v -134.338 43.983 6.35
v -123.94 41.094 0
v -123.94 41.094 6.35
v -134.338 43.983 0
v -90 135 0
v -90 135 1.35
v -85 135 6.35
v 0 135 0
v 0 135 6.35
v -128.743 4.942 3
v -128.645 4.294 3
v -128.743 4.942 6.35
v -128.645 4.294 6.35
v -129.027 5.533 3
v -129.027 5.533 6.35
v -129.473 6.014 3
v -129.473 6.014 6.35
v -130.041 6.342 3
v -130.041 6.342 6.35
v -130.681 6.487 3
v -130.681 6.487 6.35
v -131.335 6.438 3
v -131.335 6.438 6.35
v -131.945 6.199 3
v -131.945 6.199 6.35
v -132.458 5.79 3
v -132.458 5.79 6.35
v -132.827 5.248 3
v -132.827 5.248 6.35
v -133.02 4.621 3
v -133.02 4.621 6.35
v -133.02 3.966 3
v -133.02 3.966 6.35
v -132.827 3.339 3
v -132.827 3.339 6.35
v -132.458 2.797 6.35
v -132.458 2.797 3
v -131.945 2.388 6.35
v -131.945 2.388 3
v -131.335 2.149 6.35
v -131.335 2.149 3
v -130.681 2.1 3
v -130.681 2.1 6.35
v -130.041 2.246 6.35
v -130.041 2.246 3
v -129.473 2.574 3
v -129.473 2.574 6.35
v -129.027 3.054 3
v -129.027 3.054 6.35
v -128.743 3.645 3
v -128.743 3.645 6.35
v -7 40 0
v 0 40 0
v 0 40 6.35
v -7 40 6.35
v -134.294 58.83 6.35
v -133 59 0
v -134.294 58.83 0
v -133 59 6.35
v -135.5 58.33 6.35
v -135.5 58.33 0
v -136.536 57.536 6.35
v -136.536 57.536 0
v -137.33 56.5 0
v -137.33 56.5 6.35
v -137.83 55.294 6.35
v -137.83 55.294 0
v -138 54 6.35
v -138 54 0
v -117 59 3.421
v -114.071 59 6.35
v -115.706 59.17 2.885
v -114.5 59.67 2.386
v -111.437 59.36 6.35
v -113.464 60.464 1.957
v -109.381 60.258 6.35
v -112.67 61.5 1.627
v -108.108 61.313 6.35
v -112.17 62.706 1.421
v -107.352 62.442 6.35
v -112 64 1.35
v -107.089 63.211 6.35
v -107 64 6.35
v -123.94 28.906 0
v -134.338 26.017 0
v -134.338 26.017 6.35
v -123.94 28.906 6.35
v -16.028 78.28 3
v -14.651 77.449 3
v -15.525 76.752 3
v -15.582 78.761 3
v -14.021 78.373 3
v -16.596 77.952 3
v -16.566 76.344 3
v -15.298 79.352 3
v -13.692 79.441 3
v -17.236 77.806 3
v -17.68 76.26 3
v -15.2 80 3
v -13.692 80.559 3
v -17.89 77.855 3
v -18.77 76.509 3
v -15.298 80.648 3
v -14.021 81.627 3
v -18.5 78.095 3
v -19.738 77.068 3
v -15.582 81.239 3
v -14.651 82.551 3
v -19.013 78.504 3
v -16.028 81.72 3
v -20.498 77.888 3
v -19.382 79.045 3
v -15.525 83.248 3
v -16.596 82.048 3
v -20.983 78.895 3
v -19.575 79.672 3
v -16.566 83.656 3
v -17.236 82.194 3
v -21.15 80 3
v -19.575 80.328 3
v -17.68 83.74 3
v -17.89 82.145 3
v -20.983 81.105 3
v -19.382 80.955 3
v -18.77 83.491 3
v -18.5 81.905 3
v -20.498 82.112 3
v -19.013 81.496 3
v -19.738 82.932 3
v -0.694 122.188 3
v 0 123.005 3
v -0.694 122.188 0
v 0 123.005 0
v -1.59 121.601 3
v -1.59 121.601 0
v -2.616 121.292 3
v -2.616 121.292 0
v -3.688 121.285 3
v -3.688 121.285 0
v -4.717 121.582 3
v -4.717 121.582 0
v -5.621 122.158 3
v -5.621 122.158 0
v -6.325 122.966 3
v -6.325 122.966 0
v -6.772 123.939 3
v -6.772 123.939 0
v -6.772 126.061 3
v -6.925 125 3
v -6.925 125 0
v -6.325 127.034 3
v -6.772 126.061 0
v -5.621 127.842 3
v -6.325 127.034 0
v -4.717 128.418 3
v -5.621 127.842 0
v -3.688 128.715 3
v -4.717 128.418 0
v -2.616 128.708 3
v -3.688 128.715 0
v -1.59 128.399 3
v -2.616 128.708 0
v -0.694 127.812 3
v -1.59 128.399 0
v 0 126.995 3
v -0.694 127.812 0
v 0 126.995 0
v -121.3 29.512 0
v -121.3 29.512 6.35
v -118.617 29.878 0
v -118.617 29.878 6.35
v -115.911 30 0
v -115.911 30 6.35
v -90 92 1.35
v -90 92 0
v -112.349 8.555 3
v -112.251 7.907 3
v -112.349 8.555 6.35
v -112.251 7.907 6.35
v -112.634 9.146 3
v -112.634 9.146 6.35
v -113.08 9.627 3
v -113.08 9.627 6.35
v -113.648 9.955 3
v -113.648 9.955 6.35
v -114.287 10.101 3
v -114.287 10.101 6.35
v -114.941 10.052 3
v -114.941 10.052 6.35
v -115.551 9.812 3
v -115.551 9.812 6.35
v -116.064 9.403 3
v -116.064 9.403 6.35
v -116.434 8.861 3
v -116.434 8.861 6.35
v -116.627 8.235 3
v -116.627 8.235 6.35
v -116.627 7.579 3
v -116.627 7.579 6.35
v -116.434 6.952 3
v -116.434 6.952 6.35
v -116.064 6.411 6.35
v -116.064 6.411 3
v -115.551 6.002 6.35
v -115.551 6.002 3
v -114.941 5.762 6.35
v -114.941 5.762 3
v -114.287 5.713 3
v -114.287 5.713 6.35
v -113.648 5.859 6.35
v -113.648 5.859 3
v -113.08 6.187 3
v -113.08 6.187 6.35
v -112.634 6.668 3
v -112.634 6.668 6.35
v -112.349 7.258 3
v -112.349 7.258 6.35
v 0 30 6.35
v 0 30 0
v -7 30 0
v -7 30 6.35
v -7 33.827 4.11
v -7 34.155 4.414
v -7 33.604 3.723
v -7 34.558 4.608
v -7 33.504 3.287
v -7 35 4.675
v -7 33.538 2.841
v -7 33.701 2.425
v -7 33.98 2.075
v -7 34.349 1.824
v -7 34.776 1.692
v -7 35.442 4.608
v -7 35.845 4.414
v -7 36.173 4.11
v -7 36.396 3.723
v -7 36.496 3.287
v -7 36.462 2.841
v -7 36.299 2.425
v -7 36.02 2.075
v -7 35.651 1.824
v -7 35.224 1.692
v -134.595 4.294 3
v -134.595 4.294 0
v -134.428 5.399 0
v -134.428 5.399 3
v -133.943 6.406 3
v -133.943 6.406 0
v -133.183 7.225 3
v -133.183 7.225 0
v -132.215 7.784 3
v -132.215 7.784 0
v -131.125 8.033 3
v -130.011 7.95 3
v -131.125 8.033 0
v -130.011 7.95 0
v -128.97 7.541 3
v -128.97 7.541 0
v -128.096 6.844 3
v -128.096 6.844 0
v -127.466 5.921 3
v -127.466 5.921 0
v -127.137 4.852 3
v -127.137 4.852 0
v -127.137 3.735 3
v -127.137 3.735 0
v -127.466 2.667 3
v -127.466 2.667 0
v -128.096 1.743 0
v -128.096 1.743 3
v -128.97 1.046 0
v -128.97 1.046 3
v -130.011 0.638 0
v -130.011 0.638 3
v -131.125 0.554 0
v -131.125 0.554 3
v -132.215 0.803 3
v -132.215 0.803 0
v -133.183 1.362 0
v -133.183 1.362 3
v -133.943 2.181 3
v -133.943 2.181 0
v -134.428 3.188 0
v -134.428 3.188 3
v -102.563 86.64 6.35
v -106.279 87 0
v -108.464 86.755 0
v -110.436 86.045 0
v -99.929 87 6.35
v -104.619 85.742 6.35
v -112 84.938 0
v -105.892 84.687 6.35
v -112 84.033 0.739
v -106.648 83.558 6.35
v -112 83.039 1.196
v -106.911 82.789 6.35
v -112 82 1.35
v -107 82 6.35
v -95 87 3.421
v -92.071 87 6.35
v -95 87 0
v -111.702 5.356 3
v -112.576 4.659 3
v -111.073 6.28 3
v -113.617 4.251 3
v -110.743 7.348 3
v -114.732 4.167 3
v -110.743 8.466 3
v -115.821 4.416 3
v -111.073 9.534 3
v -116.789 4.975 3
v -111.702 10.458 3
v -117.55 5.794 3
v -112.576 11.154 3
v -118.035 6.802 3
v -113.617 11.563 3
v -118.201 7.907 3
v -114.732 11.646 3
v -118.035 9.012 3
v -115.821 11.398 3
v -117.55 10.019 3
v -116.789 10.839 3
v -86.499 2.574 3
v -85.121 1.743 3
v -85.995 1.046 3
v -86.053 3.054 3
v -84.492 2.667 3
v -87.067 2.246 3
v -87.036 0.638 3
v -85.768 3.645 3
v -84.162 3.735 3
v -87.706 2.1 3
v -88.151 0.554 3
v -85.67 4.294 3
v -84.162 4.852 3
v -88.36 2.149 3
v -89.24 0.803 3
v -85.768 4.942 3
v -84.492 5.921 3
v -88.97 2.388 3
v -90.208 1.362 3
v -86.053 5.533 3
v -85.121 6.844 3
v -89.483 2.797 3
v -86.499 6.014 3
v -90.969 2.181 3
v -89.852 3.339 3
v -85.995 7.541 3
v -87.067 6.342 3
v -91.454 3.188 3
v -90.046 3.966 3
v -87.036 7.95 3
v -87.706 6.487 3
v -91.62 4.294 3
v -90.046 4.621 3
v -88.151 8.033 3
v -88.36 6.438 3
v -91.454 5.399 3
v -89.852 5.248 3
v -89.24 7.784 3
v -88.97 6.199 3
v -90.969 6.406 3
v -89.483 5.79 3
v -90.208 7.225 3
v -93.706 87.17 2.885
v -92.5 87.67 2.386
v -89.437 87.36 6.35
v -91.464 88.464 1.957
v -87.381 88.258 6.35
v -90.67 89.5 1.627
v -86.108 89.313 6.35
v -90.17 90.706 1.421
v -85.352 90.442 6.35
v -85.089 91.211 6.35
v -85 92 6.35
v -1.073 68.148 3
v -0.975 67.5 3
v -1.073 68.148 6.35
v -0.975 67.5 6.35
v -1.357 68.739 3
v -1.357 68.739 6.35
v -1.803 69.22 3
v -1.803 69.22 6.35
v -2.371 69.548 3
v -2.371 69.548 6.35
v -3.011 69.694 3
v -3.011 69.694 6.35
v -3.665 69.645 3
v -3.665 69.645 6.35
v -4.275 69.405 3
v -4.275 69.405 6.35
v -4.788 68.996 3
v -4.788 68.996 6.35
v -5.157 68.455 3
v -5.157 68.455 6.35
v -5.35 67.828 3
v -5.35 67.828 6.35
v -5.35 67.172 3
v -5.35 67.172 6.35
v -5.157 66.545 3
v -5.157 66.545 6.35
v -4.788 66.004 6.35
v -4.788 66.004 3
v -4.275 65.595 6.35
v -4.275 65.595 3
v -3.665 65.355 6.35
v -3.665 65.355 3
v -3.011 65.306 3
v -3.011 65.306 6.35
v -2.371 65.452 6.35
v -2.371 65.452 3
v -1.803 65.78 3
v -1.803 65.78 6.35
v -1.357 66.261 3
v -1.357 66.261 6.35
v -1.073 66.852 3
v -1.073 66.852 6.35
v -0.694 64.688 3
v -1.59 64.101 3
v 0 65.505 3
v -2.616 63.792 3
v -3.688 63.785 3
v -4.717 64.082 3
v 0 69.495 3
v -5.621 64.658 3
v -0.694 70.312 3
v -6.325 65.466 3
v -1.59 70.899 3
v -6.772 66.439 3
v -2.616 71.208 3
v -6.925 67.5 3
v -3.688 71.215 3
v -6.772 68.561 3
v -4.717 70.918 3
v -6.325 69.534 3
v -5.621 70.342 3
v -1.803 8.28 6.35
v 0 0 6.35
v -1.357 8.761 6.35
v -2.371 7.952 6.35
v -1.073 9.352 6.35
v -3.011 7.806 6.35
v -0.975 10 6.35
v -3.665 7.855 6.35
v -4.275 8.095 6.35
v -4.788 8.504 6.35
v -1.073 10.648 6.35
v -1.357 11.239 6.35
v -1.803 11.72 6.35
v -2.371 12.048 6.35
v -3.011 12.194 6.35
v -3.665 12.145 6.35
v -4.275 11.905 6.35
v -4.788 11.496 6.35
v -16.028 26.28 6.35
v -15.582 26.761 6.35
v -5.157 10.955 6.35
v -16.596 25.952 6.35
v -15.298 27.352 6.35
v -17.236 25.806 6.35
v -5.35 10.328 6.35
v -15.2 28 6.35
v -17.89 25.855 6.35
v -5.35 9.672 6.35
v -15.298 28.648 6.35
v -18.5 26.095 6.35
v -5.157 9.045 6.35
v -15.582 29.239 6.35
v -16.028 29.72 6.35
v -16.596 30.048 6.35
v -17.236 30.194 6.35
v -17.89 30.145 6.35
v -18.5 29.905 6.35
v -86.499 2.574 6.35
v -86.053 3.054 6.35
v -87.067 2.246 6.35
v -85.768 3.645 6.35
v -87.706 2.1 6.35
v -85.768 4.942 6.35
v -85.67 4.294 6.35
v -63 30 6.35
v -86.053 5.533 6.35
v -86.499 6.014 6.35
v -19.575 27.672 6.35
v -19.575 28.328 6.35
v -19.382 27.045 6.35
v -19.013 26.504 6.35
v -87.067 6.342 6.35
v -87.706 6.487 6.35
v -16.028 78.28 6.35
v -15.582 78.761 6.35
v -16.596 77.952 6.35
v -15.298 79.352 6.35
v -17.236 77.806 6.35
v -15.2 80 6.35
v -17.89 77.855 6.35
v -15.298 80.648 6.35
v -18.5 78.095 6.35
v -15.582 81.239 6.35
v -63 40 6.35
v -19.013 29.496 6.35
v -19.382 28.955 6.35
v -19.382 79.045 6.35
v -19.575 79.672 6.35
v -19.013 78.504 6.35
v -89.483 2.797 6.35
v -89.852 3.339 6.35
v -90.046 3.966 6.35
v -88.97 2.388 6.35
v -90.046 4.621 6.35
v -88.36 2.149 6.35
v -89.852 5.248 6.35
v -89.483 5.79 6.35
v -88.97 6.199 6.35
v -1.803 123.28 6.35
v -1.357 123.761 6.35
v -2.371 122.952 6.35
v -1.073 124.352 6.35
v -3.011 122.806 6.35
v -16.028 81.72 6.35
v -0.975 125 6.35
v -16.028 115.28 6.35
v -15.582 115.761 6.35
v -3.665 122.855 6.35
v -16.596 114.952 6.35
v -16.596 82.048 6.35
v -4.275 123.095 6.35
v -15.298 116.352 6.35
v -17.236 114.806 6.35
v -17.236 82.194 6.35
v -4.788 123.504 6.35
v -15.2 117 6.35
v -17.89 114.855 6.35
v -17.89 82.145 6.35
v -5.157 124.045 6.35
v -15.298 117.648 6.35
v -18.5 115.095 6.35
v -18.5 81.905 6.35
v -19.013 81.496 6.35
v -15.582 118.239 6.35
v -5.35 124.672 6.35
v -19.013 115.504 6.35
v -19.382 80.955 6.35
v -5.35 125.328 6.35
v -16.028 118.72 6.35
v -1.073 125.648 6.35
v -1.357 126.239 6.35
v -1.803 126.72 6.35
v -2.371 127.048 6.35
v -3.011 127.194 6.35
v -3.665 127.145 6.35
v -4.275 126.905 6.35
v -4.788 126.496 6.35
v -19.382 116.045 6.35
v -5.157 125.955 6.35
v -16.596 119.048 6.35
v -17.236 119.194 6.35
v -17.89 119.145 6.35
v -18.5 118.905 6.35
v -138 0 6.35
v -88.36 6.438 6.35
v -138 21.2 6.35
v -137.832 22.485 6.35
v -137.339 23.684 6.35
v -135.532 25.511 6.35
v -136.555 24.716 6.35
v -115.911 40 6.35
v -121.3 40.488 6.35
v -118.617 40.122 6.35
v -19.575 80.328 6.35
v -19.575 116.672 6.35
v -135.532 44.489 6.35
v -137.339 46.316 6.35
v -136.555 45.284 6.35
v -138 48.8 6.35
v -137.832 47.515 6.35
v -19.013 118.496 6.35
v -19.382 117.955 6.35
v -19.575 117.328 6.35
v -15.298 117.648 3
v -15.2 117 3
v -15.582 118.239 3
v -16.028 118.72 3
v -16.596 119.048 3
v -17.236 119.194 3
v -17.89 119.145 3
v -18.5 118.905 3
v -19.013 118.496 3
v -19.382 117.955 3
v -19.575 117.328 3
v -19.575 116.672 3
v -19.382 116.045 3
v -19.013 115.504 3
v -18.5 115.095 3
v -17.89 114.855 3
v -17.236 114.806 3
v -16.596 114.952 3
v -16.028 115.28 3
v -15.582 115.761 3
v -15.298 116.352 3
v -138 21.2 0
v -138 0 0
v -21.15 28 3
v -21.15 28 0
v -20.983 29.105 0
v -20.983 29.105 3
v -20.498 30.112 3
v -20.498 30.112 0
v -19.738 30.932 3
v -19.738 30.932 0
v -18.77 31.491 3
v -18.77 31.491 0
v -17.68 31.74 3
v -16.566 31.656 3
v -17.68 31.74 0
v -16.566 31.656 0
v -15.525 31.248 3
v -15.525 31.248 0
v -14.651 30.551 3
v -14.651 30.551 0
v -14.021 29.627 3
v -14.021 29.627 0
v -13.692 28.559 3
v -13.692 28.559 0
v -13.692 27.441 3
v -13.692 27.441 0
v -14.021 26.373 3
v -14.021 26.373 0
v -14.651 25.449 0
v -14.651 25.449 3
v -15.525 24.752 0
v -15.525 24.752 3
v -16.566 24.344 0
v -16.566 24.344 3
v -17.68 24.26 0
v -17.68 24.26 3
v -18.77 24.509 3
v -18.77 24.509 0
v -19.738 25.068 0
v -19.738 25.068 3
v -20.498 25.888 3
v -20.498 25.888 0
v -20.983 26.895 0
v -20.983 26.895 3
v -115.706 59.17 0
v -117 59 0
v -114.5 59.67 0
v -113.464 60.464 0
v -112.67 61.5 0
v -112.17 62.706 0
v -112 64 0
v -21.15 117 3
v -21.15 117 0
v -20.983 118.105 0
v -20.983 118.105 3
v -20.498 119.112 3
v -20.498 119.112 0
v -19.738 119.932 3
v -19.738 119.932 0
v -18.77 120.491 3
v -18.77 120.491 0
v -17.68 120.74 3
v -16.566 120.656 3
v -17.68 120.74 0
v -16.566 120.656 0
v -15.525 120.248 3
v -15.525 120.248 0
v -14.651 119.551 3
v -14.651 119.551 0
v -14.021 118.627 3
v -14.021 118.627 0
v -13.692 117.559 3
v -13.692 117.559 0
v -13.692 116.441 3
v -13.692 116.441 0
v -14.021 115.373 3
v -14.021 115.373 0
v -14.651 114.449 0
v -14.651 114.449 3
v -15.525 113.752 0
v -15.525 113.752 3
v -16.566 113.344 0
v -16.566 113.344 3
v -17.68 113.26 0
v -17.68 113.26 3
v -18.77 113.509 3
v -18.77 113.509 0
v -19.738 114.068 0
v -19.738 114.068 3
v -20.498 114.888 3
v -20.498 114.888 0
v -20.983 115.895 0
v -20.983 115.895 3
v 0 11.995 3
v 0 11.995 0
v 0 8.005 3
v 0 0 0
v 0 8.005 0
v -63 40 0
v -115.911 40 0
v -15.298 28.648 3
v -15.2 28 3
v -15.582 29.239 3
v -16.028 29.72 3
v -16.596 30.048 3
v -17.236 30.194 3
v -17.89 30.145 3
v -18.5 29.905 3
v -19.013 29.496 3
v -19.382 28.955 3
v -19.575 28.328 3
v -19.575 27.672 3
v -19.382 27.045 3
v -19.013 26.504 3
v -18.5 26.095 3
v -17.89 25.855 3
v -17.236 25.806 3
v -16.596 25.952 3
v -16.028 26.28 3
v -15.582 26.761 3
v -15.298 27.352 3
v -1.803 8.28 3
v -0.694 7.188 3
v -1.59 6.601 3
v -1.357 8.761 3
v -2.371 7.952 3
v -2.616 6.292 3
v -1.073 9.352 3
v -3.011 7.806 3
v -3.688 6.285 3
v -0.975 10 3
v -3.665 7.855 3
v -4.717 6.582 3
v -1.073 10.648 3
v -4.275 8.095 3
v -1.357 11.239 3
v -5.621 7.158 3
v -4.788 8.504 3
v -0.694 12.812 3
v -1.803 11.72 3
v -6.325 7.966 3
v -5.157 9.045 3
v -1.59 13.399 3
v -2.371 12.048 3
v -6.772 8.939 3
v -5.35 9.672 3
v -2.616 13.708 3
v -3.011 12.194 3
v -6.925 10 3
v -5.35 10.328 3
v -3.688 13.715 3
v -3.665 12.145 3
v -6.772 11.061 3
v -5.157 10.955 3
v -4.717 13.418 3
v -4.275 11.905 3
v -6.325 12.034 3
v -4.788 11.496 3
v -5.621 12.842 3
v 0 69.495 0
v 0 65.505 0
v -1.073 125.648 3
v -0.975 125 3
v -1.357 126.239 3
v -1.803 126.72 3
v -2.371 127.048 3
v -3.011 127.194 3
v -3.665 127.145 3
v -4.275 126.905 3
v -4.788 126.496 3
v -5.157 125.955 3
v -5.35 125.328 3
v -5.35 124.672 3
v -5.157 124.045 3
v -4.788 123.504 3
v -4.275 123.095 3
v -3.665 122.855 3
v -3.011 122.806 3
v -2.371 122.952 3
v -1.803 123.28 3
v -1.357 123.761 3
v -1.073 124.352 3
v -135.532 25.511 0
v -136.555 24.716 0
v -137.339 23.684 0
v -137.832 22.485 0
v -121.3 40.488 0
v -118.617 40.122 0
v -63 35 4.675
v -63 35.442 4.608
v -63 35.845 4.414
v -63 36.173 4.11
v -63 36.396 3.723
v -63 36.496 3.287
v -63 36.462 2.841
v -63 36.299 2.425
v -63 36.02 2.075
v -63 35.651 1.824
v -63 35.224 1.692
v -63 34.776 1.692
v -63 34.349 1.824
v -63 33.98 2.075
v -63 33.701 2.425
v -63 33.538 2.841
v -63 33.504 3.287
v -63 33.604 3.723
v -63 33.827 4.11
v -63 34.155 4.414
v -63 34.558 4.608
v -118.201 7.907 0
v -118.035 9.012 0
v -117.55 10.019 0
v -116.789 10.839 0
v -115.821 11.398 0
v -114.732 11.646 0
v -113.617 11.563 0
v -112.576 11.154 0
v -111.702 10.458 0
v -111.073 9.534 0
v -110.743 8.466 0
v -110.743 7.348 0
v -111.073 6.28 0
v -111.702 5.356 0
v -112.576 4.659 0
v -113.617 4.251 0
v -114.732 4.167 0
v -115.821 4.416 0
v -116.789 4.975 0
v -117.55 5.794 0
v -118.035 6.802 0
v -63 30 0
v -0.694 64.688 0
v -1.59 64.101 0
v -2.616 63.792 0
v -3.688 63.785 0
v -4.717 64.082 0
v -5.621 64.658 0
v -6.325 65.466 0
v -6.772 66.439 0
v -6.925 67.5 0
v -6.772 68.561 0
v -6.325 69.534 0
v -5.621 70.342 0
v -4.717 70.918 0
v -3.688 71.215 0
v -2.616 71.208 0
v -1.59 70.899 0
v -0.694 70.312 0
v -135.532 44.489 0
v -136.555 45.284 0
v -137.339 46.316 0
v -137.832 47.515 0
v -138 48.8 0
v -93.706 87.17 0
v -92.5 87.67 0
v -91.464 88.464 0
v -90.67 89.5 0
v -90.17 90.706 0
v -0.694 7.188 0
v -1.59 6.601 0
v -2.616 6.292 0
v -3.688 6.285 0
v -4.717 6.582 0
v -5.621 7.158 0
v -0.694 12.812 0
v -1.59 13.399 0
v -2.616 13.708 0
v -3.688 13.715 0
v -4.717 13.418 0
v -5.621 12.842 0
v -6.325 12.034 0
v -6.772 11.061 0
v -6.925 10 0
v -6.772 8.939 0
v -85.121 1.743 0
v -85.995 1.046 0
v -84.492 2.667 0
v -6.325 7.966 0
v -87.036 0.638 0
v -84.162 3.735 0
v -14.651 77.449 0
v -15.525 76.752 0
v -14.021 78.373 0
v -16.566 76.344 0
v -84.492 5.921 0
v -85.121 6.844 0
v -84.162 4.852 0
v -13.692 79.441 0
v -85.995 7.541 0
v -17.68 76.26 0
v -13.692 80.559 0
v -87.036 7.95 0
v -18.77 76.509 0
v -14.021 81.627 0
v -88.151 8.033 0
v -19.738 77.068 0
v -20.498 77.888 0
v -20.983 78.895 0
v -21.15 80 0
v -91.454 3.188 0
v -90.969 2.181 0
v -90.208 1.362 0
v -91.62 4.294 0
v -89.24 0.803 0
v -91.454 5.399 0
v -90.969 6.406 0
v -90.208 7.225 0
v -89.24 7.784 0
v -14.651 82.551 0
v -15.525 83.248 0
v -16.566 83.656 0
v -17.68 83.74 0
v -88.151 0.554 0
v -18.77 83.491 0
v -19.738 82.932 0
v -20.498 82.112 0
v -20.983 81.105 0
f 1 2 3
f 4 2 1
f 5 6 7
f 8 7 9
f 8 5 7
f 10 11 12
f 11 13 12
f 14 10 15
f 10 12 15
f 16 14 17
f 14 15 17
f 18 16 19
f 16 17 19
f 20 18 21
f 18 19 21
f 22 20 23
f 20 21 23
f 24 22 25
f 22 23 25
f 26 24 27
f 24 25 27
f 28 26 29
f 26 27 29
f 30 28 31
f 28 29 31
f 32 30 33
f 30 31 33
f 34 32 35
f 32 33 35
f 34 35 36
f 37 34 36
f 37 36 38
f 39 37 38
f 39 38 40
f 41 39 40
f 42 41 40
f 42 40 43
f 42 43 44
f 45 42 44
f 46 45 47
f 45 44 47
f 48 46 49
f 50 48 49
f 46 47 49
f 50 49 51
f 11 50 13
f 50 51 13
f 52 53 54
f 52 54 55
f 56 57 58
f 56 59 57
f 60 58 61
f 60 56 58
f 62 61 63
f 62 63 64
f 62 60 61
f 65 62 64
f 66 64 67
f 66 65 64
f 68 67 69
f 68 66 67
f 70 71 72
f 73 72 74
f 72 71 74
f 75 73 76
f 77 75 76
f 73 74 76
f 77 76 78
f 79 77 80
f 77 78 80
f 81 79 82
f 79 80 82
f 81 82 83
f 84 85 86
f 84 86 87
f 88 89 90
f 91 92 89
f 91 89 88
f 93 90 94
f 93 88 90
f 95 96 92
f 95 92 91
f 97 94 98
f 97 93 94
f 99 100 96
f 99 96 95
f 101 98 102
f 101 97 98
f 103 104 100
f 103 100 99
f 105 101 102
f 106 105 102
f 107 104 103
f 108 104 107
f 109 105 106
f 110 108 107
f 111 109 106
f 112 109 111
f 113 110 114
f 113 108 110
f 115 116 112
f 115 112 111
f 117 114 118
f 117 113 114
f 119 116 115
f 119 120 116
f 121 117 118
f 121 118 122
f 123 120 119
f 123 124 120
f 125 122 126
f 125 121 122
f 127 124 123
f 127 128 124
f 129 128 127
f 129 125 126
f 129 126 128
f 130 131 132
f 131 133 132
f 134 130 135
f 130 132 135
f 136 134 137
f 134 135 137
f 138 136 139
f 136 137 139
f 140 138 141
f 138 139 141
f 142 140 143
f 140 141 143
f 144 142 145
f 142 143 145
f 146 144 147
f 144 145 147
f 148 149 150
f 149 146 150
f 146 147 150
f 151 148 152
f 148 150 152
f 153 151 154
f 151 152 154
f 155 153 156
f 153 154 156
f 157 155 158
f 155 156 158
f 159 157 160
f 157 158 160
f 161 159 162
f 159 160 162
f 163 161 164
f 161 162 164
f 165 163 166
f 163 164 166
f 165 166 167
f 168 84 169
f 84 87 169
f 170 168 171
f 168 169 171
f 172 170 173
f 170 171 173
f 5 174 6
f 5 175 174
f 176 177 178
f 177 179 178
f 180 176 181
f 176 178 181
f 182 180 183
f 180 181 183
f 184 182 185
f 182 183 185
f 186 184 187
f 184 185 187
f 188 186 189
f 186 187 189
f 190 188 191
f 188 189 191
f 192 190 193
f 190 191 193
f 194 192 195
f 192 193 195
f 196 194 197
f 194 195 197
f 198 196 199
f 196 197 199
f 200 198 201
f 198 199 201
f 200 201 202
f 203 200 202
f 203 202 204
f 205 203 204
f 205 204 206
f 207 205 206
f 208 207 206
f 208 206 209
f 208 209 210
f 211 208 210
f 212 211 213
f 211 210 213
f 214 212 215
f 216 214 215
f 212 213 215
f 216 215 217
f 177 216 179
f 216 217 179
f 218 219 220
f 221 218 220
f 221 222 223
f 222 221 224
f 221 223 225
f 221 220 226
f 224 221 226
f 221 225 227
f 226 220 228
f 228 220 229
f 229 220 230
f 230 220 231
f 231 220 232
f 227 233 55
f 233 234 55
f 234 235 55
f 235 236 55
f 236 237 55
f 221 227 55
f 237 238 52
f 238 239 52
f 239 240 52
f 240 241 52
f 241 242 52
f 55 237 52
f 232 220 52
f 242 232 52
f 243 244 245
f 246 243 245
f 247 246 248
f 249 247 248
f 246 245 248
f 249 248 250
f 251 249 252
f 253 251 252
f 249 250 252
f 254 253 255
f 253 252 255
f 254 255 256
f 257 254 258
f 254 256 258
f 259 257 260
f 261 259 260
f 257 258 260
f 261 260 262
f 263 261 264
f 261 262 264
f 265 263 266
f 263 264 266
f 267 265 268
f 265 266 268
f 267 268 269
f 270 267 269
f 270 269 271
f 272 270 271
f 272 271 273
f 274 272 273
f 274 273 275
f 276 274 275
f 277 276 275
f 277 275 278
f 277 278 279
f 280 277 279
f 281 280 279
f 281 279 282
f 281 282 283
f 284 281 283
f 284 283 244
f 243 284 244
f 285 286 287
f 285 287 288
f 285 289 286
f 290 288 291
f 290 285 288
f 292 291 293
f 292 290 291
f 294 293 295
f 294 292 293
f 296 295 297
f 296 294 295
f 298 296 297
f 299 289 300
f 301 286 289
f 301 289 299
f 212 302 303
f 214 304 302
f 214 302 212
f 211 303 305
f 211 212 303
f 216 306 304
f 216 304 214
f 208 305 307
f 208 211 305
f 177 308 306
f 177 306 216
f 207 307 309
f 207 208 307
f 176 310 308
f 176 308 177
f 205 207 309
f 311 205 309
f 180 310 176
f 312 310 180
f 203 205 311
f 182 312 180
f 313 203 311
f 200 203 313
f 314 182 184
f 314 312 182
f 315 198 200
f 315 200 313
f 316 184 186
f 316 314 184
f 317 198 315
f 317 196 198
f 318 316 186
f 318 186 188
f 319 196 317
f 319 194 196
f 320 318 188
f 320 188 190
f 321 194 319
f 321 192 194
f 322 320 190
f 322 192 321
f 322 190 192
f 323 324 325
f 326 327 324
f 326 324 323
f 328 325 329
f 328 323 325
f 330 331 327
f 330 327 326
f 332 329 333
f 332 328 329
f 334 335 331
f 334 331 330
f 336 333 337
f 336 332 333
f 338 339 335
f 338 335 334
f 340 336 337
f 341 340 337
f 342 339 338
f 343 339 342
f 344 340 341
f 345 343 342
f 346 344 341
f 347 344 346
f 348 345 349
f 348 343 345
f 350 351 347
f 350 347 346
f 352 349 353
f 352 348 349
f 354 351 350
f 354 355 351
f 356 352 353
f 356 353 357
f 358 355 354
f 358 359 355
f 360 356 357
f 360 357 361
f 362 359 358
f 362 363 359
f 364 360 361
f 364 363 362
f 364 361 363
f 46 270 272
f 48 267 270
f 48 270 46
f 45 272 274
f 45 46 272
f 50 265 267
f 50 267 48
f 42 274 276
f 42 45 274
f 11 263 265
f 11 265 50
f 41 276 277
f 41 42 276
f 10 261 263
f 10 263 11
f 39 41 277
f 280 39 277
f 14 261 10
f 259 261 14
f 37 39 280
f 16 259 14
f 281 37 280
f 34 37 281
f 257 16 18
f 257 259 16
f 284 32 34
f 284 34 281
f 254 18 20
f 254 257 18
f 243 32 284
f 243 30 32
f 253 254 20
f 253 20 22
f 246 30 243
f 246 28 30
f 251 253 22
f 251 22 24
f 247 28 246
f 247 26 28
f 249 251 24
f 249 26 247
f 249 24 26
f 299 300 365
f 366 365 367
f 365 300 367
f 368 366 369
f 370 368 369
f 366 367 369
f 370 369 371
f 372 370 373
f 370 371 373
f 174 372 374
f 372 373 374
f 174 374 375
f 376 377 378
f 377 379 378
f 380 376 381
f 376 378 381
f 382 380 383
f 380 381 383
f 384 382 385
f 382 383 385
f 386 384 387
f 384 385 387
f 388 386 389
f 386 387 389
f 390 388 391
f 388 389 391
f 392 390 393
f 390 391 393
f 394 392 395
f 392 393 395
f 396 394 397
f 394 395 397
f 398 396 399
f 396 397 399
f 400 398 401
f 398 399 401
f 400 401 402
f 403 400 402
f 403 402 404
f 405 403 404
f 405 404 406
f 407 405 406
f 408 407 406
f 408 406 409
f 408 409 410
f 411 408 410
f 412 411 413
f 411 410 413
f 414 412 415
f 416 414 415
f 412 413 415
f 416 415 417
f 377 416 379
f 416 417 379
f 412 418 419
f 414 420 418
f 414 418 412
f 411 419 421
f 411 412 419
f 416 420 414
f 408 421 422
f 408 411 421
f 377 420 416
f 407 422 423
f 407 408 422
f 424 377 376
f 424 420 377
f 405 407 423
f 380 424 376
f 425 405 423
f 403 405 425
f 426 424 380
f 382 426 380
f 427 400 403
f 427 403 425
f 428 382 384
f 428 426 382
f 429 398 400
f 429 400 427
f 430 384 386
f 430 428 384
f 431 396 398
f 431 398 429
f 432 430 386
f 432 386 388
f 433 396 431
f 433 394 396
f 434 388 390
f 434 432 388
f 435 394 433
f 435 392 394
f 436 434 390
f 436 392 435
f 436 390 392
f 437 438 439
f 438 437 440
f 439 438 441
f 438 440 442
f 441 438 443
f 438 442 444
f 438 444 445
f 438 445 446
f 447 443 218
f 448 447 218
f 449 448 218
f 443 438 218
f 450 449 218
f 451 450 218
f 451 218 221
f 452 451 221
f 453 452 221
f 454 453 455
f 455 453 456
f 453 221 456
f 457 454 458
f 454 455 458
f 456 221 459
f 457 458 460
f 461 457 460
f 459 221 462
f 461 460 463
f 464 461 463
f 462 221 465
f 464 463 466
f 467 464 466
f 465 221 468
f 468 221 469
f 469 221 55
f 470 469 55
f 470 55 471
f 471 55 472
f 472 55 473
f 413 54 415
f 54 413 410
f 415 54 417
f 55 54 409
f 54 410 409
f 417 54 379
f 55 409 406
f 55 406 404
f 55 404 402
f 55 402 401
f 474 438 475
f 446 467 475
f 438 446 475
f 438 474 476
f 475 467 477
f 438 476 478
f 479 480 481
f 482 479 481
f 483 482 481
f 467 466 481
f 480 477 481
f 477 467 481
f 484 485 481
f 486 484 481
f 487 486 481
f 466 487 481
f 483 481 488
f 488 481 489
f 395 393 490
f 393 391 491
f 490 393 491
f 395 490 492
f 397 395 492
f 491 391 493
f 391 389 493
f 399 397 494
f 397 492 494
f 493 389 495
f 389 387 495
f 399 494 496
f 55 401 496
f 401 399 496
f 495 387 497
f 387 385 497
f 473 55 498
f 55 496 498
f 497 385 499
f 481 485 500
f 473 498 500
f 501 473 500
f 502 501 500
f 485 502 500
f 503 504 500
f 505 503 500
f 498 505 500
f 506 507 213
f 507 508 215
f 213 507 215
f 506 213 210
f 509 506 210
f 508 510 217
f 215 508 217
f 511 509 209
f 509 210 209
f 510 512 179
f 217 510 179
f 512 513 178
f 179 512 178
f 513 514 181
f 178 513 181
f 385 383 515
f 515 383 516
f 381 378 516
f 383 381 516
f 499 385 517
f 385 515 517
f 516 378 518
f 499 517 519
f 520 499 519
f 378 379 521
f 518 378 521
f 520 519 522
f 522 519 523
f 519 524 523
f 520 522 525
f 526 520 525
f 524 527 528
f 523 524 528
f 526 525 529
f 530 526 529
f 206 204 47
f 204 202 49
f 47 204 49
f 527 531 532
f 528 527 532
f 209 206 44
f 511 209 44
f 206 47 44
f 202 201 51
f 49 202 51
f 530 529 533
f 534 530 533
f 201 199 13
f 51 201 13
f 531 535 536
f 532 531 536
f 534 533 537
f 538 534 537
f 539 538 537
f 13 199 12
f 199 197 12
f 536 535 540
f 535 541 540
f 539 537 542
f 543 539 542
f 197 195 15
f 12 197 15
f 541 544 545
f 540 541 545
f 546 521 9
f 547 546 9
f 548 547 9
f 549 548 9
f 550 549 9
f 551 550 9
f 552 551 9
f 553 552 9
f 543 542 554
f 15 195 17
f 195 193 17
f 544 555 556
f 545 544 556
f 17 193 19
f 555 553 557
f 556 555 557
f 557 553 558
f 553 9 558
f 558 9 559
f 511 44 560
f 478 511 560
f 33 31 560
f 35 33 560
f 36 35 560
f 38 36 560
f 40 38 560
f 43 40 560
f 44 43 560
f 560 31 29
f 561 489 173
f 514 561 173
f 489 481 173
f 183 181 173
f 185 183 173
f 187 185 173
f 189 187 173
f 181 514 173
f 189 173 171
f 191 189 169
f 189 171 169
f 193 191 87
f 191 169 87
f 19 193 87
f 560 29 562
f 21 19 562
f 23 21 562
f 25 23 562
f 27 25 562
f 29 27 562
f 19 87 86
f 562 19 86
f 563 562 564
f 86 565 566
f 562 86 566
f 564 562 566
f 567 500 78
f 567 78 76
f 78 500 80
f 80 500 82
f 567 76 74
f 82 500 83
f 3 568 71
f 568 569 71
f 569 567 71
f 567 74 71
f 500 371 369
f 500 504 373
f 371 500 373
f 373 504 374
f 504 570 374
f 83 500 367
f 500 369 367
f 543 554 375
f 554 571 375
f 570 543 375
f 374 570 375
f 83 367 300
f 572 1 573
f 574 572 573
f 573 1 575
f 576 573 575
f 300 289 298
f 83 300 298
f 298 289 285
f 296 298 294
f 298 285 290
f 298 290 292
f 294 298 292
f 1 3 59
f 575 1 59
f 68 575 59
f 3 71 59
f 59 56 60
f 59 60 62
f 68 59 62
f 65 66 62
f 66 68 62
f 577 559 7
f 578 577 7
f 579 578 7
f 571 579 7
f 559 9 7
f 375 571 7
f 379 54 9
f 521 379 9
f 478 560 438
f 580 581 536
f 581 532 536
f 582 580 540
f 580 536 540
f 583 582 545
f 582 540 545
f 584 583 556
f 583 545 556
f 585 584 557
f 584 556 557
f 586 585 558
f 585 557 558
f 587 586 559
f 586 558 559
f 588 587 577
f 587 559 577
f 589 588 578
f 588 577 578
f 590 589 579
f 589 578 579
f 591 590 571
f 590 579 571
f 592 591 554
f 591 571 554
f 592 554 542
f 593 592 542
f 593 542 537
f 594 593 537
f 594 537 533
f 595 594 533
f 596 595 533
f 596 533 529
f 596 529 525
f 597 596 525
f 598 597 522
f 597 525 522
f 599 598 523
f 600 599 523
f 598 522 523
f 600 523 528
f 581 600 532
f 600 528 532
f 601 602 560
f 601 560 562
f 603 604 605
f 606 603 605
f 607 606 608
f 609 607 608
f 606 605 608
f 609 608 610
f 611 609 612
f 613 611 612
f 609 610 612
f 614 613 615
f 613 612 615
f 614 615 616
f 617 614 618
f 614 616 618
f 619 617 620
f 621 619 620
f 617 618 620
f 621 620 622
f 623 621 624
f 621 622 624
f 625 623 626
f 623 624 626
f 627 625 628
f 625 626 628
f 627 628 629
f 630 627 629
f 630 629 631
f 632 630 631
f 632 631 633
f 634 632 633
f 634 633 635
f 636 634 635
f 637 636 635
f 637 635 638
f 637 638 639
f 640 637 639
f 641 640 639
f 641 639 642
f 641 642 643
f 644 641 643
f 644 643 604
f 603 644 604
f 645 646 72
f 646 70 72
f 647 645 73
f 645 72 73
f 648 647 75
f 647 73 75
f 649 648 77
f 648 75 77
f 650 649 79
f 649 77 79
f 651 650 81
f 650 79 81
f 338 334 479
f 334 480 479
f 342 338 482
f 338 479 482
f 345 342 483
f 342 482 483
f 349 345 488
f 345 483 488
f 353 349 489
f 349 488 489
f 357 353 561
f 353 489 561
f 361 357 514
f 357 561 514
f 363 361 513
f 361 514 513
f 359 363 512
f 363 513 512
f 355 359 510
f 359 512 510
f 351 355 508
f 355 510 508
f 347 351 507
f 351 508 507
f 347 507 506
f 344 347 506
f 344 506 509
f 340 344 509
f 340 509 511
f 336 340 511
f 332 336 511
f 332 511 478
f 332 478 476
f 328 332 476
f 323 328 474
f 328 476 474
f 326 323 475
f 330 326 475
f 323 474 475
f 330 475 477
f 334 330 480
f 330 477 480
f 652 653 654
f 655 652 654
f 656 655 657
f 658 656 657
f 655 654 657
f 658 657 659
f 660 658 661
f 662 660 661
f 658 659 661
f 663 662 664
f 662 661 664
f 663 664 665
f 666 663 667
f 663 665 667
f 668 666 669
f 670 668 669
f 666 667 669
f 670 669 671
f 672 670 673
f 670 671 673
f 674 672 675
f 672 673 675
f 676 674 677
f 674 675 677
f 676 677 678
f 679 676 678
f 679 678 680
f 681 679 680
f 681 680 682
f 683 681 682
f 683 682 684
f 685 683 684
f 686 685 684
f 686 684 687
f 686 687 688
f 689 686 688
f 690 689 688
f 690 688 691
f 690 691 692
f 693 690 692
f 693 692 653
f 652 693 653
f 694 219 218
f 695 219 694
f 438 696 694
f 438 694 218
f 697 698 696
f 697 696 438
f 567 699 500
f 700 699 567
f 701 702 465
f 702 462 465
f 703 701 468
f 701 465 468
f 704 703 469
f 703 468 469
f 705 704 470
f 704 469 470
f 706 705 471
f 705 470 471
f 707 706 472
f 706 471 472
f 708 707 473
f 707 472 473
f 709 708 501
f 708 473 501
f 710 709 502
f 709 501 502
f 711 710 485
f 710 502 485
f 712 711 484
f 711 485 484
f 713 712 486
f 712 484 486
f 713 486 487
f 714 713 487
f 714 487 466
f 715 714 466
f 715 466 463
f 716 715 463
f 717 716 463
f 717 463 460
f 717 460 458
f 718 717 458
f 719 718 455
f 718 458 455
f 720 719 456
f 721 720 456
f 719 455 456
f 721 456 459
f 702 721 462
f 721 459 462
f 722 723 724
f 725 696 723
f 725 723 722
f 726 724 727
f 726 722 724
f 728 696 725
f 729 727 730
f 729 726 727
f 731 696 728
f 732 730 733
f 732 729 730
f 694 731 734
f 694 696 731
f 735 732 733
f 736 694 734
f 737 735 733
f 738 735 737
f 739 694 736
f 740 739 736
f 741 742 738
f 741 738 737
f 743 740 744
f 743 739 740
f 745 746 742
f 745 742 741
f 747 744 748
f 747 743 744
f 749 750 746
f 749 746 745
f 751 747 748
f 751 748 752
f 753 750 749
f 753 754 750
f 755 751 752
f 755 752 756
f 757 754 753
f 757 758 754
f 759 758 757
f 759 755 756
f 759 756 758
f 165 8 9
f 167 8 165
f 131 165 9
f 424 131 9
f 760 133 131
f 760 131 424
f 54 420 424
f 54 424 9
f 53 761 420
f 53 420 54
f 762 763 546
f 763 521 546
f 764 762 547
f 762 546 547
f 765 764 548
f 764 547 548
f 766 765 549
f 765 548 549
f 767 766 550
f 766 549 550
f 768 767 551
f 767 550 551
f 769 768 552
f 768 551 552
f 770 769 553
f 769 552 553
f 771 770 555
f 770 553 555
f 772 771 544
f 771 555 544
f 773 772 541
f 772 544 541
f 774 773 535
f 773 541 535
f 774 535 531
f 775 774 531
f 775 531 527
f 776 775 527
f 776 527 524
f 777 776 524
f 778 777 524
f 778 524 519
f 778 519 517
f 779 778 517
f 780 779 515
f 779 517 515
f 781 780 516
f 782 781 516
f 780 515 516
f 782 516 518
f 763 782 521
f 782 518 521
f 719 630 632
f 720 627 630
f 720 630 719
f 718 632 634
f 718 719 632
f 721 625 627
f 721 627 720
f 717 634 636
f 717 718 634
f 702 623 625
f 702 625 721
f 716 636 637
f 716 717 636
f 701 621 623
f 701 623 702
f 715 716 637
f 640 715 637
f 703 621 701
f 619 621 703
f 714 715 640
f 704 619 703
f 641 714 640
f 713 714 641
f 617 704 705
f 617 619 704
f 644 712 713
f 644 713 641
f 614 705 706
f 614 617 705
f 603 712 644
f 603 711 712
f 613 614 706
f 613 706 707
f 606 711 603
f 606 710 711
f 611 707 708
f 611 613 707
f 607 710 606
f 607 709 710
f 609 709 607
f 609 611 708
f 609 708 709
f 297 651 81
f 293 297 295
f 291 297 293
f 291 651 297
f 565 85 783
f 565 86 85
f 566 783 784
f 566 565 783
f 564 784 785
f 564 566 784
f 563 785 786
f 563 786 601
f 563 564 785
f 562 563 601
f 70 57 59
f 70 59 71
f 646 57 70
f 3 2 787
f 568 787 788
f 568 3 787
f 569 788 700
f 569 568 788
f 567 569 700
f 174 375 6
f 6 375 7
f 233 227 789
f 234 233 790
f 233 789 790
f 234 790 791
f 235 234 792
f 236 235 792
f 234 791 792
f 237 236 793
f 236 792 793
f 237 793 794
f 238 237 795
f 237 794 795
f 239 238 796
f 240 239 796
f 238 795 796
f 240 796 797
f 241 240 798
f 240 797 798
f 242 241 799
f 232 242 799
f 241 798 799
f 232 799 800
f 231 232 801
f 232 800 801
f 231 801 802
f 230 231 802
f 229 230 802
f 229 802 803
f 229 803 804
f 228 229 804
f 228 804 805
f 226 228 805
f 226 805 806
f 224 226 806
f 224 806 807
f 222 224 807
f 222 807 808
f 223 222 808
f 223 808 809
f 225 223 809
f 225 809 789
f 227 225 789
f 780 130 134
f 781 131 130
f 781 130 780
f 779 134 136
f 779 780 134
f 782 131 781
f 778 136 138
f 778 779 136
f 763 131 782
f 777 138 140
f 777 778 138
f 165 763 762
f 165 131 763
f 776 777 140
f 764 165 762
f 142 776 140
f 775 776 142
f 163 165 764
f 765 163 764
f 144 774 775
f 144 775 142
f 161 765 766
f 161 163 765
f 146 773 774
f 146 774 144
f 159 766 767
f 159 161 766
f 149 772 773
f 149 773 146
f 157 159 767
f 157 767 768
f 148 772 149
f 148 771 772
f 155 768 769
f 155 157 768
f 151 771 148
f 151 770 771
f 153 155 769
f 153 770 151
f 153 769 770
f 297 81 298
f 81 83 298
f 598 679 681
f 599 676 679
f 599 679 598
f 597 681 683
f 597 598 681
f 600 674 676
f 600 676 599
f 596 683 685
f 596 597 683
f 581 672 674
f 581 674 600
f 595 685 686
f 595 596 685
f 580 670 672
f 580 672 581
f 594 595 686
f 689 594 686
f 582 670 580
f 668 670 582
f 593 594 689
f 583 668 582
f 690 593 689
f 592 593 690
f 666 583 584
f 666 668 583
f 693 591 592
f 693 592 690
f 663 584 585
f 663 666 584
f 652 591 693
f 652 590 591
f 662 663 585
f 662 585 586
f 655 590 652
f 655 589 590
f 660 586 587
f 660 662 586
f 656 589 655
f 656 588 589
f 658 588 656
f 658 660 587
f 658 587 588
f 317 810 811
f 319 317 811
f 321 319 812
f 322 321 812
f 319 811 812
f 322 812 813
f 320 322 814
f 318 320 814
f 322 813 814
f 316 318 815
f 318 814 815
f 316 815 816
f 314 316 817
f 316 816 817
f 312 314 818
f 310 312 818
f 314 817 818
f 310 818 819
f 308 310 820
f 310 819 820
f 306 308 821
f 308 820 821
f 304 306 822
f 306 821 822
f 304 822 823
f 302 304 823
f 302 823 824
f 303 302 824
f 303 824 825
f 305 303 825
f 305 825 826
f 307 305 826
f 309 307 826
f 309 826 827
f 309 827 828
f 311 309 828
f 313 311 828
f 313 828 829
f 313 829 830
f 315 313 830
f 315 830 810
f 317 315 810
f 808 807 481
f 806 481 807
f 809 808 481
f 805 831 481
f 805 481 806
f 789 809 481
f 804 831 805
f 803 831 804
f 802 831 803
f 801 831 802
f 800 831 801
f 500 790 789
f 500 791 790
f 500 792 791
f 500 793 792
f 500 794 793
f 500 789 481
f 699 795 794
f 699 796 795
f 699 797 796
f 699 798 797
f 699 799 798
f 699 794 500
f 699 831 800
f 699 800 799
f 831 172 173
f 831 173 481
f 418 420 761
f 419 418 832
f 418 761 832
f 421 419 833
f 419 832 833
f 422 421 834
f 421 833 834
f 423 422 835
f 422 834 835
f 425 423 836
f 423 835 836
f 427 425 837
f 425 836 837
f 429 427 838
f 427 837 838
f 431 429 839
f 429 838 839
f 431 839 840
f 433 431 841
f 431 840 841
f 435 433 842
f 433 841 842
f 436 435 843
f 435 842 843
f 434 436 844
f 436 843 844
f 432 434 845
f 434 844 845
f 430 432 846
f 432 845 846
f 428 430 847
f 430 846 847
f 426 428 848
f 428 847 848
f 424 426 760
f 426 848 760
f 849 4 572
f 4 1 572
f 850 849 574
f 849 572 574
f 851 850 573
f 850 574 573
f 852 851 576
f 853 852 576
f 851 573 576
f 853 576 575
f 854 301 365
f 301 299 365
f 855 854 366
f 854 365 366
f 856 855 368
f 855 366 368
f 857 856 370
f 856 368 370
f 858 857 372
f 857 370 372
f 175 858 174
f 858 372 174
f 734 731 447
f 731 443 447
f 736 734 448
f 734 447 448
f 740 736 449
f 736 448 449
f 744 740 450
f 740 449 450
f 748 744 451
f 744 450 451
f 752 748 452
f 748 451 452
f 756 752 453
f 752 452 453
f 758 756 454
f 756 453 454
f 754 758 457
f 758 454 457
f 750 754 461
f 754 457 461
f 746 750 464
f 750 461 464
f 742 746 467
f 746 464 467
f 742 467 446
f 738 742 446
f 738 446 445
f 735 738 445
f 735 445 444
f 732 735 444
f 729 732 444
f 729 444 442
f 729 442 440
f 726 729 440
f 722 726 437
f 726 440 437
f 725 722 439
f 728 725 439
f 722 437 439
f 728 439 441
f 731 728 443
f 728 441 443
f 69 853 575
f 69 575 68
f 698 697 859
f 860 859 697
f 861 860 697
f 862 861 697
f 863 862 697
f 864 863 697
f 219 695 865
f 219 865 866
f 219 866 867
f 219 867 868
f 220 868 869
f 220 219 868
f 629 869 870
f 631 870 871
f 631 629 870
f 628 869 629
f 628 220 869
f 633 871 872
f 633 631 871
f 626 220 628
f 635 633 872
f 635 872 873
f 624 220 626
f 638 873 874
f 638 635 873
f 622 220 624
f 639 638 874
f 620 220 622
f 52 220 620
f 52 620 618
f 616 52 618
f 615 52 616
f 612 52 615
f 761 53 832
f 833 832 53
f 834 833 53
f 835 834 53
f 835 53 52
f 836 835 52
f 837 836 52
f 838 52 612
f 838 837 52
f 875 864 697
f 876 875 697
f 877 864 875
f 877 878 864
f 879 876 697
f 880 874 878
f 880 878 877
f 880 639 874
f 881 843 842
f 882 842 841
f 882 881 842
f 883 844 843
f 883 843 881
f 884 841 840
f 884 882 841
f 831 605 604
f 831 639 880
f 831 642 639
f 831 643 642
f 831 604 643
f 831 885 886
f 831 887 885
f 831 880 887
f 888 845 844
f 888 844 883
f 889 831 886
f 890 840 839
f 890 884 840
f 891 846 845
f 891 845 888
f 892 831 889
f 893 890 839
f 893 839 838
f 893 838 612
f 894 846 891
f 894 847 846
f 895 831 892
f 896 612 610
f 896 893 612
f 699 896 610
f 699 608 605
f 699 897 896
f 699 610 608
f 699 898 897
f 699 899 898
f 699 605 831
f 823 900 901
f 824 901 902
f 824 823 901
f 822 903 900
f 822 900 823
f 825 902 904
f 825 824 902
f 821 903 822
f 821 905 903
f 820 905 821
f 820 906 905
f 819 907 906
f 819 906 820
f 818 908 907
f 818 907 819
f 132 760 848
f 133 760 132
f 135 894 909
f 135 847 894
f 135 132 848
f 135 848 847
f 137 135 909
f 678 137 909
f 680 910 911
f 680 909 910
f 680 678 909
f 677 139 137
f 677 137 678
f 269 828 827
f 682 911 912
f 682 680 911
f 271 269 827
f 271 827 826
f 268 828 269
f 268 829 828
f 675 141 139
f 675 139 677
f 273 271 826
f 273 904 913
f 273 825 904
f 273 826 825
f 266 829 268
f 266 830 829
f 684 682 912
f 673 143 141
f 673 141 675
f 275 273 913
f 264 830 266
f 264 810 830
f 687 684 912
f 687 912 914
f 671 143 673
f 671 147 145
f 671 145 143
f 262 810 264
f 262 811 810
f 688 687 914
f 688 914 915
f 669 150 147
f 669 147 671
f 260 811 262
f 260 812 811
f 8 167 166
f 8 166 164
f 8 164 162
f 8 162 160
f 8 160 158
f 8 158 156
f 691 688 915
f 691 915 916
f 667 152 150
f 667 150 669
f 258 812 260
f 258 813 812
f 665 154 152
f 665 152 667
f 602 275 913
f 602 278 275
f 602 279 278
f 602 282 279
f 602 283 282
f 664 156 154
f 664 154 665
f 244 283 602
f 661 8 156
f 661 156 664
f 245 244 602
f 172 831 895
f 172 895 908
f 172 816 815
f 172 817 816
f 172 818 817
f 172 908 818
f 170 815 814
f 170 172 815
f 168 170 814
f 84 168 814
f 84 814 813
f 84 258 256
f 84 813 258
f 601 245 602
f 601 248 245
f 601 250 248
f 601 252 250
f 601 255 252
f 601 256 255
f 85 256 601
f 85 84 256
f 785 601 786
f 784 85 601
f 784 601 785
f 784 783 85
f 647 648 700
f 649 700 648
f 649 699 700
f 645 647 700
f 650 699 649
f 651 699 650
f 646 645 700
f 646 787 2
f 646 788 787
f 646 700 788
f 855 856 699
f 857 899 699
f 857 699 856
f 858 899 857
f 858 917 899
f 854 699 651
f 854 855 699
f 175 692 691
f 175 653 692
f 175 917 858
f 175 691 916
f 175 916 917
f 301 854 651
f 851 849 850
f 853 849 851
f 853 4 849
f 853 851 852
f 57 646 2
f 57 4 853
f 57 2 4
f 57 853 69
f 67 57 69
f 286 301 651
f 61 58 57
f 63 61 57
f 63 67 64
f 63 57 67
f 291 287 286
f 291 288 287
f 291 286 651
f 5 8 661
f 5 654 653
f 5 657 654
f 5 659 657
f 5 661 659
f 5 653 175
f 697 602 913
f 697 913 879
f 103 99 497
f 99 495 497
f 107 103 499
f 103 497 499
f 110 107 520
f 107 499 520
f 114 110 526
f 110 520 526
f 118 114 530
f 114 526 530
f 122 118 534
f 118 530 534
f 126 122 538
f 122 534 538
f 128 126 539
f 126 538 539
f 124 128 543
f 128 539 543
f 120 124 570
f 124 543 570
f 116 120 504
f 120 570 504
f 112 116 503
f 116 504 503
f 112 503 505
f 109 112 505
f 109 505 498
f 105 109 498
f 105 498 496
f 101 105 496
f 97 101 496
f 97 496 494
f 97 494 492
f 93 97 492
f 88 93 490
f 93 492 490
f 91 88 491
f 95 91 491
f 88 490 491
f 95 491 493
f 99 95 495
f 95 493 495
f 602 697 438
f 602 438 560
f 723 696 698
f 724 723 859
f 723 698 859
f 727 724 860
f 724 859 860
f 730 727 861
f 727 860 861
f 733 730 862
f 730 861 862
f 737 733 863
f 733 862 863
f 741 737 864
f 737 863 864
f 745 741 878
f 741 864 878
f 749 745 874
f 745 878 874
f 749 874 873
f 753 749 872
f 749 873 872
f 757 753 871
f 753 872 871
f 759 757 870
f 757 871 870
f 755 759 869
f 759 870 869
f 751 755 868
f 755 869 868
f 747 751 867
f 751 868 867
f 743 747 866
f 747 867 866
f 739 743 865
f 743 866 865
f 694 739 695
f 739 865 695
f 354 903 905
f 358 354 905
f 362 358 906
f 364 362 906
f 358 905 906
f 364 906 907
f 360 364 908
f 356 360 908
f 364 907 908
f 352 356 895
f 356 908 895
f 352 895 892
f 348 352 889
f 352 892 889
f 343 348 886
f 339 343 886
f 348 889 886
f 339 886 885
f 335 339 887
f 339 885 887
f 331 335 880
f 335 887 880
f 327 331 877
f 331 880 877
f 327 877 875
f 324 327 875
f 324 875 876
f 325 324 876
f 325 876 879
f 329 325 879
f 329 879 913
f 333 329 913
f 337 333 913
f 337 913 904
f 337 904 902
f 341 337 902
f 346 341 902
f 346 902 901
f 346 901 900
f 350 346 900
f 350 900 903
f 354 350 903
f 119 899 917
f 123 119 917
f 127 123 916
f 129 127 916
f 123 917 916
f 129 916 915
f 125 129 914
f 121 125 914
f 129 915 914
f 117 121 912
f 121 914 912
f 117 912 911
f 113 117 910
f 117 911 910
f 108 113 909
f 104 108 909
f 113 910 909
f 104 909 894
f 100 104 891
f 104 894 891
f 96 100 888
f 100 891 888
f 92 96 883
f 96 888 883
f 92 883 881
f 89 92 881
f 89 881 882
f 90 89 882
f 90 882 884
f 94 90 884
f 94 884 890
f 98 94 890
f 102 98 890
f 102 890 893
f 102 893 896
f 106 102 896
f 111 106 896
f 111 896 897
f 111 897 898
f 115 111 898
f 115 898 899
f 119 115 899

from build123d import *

# Parameters (mm, degrees)
BOSS_EXTRUDE1_DEPTH = 6.35
CUT_EXTRUDE1_DEPTH  = 194.156212688
SKETCH5_R           = 1.5
CUT_EXTRUDE2_DEPTH  = 155.564945897
FILLET1_R           = 30
CHAMFER1_SIZE       = 5
FILLET2_R           = 5
FILLET3_R           = 5
SKETCH6_W           = 7
SKETCH6_H           = 10
CUT_EXTRUDE3_DEPTH  = 194.156212688
HOLE1_D             = 4.4
HOLE1_CBORE_D       = 7.5
HOLE1_CBORE_DEPTH   = 3
HOLE2_D             = 4.4
HOLE2_CBORE_D       = 7.5
HOLE2_CBORE_DEPTH   = 3
FILLET4_R           = 5
HOLE3_D             = 4.4
HOLE3_CBORE_D       = 7.5
HOLE3_CBORE_DEPTH   = 3


with BuildPart() as part:
    # Sketch1 → Boss-Extrude1 (new body)
    with BuildSketch(Plane.XY):
        Polygon((0, 0), (-138, 0), (-138, 30), (-63, 30), (-63, 40), (-138, 40), (-138, 59), (-112, 59), (-112, 87), (-90, 87), (-90, 135), (0, 135), align=None)
    extrude(amount=BOSS_EXTRUDE1_DEPTH)

    # Sketch4 → Cut-Extrude1 (cut, through all)
    with BuildSketch(Plane(origin=(0, 0, 0), x_dir=(-1, 0, 0), z_dir=(0, 0, -1))):
        Polygon((120, 40), (138, 45), (138, 40), align=None)
        Polygon((120, 30), (138, 30), (138, 25), align=None)
    extrude(amount=-CUT_EXTRUDE1_DEPTH, mode=Mode.SUBTRACT)

    # Sketch5 → Cut-Extrude2 (cut, through all)
    with BuildSketch(Plane.ZY.offset(63)):
        with Locations((3.175, 35)):
            Circle(SKETCH5_R)
    extrude(amount=-CUT_EXTRUDE2_DEPTH, mode=Mode.SUBTRACT)

    # Fillet1
    fillet1_edges = [part.edges().sort_by_distance(p)[0] for p in [
        (-120, 40, 3.175),
        (-120, 30, 3.175),
    ]]
    fillet(fillet1_edges, radius=FILLET1_R)

    # Chamfer1
    chamfer1_edges = [part.edges().sort_by_distance(p)[0] for p in [
        (-90, 111, 6.35),
        (-112, 73, 6.35),
    ]]
    chamfer(chamfer1_edges, length=CHAMFER1_SIZE)

    # Fillet2
    fillet2_edges = [part.edges().sort_by_distance(p)[0] for p in [
        (-138, 59, 3.175),
        (-138, 45, 3.175),
        (-138, 25, 3.175),
    ]]
    fillet(fillet2_edges, radius=FILLET2_R)

    # Fillet3
    fillet3_edges = [part.edges().sort_by_distance(p)[0] for p in [
        (-112, 59, 0.675),
        (-90, 87, 0.675),
        (-109.5, 59, 3.85),
        (-87.5, 87, 3.85),
    ]]
    fillet(fillet3_edges, radius=FILLET3_R)

    # Sketch6 → Cut-Extrude3 (cut, through all)
    with BuildSketch(Plane(origin=(0, 0, 0), x_dir=(-1, 0, 0), z_dir=(0, 0, -1))):
        with Locations((3.5, 35)):
            Rectangle(SKETCH6_W, SKETCH6_H)
    extrude(amount=-CUT_EXTRUDE3_DEPTH, mode=Mode.SUBTRACT)

    # Hole1 (through all)
    with Locations(Plane(origin=(0, 0, 0), x_dir=(-1, 0, 0), z_dir=(0, 0, -1))):
        with Locations((3.175, 125), (3.175, 67.5), (3.175, 10)):
            CounterBoreHole(HOLE1_D / 2, HOLE1_CBORE_D / 2, HOLE1_CBORE_DEPTH)

    # Hole2 (through all)
    with Locations(Plane(origin=(0, 0, 0), x_dir=(-1, 0, 0), z_dir=(0, 0, -1))):
        with Locations((17.4, 117), (17.4, 80), (17.4, 28)):
            CounterBoreHole(HOLE2_D / 2, HOLE2_CBORE_D / 2, HOLE2_CBORE_DEPTH)

    # Fillet4
    fillet4_edges = [part.edges().sort_by_distance(p)[0] for p in [
        (-109.5, 87, 3.85),
    ]]
    fillet(fillet4_edges, radius=FILLET4_R)

    # Hole3 (through all)
    with Locations(Plane(origin=(0, 0, 0), x_dir=(-1, 0, 0), z_dir=(0, 0, -1))):
        with Locations((87.870353785, 4.293591352), (114.451398707, 7.906888356), (130.844995532, 4.293591352)):
            CounterBoreHole(HOLE3_D / 2, HOLE3_CBORE_D / 2, HOLE3_CBORE_DEPTH)


solid = part.part
